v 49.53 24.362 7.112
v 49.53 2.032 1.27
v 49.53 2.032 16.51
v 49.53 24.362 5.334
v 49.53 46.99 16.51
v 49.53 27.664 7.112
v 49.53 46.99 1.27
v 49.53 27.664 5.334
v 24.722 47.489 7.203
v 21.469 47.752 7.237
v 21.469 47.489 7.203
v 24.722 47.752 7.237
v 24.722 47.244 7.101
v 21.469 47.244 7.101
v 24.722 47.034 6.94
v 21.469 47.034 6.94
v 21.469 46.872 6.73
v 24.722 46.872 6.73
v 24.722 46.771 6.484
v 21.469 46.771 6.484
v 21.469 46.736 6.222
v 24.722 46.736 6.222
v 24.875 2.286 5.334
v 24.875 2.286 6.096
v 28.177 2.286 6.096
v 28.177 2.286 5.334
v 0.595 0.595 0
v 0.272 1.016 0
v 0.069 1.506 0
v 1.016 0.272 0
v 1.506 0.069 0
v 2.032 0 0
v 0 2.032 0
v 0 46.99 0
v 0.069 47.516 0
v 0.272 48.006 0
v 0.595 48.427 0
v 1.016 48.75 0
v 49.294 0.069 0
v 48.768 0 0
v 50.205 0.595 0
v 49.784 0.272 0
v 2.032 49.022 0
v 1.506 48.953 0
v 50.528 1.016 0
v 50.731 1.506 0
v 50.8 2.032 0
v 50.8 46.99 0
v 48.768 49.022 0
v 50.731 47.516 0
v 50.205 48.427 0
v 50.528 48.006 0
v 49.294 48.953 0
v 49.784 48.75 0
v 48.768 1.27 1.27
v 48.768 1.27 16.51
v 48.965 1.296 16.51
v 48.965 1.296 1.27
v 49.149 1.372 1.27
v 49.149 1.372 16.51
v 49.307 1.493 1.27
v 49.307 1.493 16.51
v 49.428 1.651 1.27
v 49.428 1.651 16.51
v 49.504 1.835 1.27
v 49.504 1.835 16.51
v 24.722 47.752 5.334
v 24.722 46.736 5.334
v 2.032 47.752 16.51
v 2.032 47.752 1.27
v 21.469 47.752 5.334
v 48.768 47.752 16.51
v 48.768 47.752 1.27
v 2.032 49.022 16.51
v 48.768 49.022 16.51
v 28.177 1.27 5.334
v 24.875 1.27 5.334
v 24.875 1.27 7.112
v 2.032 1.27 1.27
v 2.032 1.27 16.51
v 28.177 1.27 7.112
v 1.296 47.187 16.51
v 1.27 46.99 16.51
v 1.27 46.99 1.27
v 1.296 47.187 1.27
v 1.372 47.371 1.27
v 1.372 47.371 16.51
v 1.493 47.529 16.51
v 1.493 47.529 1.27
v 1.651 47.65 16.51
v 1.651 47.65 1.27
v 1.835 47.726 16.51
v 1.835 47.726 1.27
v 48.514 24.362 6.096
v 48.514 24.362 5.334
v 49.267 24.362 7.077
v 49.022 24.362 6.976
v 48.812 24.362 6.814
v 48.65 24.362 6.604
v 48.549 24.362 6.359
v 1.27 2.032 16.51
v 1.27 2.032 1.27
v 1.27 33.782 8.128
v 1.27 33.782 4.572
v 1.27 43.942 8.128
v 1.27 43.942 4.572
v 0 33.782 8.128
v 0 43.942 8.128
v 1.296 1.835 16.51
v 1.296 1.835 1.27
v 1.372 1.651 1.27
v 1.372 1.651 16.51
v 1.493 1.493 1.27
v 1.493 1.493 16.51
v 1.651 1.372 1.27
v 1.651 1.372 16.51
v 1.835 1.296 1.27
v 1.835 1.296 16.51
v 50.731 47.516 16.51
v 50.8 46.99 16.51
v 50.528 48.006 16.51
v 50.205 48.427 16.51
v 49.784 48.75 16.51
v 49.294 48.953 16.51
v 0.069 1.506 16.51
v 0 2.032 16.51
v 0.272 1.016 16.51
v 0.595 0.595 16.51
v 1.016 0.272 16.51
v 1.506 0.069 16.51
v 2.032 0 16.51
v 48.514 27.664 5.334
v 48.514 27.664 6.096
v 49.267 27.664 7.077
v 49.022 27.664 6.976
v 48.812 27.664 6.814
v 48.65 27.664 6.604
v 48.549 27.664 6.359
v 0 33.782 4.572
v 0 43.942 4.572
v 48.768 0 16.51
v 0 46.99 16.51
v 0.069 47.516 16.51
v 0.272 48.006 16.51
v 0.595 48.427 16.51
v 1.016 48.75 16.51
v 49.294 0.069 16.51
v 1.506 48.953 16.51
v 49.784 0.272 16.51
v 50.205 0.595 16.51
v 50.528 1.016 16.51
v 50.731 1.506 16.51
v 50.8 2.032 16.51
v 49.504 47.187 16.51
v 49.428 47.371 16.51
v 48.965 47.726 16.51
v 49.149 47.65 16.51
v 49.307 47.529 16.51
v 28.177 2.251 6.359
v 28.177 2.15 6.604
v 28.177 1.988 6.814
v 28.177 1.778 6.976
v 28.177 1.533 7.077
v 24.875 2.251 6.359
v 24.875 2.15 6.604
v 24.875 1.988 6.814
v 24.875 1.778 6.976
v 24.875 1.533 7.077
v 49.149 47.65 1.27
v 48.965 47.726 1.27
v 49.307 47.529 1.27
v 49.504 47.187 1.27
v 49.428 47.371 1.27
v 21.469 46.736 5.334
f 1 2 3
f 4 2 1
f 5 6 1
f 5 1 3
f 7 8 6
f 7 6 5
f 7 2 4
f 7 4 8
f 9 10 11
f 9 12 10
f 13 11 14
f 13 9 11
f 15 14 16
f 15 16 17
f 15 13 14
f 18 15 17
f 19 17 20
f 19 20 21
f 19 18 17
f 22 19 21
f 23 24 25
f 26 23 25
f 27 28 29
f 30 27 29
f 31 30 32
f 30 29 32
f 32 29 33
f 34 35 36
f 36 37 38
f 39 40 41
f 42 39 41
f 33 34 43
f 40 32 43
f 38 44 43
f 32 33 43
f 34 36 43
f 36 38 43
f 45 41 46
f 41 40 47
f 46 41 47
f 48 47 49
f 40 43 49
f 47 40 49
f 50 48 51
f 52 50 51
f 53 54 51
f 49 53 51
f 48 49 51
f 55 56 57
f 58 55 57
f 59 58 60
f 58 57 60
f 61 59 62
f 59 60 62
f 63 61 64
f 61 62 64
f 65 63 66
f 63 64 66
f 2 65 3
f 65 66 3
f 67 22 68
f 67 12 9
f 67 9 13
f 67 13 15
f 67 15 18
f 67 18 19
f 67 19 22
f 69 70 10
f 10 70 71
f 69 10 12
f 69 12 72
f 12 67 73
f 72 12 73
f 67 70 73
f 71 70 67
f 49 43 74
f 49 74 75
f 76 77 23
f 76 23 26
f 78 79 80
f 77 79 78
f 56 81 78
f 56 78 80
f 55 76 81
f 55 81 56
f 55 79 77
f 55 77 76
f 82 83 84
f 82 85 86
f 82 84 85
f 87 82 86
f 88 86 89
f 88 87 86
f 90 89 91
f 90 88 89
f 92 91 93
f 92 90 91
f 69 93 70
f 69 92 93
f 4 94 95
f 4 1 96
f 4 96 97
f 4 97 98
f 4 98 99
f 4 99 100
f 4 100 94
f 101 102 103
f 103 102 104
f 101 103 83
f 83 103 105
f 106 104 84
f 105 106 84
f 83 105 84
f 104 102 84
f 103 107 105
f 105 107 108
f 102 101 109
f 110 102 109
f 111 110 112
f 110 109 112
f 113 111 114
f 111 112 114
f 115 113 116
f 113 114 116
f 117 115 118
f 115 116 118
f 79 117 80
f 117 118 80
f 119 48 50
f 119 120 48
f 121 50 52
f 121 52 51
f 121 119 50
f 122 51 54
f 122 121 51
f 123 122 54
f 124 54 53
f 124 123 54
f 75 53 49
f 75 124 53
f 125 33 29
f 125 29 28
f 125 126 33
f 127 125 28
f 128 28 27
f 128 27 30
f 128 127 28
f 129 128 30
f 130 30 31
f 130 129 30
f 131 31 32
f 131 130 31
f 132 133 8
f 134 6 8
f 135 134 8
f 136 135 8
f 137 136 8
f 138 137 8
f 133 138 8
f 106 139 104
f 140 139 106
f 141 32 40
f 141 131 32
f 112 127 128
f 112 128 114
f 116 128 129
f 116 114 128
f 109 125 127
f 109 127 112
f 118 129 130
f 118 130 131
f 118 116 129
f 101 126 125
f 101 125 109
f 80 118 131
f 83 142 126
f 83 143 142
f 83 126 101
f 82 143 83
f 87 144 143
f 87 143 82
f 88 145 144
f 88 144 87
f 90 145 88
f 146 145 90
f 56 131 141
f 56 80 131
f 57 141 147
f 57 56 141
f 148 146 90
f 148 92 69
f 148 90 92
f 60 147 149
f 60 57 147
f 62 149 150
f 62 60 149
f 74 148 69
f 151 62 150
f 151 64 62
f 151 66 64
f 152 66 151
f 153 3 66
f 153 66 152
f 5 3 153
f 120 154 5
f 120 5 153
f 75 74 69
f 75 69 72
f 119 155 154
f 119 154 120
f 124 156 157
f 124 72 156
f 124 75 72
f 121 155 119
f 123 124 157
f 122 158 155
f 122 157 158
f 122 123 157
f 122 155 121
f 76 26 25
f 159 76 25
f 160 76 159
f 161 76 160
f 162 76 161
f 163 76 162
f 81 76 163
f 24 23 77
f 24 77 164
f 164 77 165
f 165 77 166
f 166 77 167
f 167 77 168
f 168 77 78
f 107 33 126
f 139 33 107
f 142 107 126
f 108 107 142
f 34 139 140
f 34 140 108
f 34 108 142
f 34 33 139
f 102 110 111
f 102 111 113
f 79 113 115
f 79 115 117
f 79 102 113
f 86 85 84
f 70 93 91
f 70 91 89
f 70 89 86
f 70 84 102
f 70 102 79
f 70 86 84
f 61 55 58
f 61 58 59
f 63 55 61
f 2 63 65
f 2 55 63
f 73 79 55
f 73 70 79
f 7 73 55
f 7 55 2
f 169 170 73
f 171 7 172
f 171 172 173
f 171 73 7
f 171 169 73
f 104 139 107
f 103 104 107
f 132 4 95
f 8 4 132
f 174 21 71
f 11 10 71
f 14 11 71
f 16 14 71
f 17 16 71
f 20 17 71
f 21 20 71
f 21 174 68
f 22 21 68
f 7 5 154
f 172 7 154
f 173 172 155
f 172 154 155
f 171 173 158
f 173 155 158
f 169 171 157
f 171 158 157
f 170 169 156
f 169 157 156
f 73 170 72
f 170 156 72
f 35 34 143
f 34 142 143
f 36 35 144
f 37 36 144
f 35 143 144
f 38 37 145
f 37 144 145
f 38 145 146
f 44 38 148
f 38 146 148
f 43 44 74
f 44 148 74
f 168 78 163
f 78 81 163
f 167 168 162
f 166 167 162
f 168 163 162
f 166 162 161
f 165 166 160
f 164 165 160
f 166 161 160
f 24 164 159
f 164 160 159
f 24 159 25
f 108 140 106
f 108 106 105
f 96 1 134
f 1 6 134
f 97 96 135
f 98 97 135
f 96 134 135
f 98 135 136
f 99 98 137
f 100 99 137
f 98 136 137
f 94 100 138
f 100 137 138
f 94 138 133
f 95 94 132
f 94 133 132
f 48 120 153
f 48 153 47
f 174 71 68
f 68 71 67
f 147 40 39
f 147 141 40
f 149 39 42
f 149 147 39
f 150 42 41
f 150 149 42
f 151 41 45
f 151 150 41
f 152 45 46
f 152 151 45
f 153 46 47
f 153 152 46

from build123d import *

# Parameters (mm, degrees)
SKETCH1_W           = 50.8
SKETCH1_H           = 49.022
BOSS_EXTRUDE2_DEPTH = 16.51
FILLET1_R           = 2.032
SHELL2_T            = -1.27
SKETCH4_W           = 3.556
SKETCH4_H           = 10.16
CUT_EXTRUDE2_DEPTH  = 1.27
SKETCH7_W           = 3.2520636
SKETCH7_H           = 1.903459875
BOSS_EXTRUDE5_DEPTH = 2.286
FILLET6_R           = 1.016
SKETCH8_W           = 1.778
SKETCH8_H           = 3.302
BOSS_EXTRUDE6_DEPTH = 2.286
FILLET7_R           = 1.016
SKETCH9_W           = 3.302
SKETCH9_H           = 1.778
BOSS_EXTRUDE7_DEPTH = 2.286
FILLET8_R           = 1.016


with BuildPart() as part:
    # Sketch1 → Boss-Extrude2 (new body)
    with BuildSketch(Plane.XY):
        with Locations((25.4, 24.511)):
            Rectangle(SKETCH1_W, SKETCH1_H)
    extrude(amount=BOSS_EXTRUDE2_DEPTH)

    # Fillet1
    fillet1_edges = [part.edges().sort_by_distance(p)[0] for p in [
        (0, 0, 8.255),
        (50.8, 0, 8.255),
        (50.8, 49.022, 8.255),
        (0, 49.022, 8.255),
    ]]
    fillet(fillet1_edges, radius=FILLET1_R)

    # Shell2
    shell2_openings = [part.faces().sort_by_distance(p)[0] for p in [
        (25.4, 24.511, 16.51),
    ]]
    offset(amount=SHELL2_T, openings=shell2_openings, kind=Kind.INTERSECTION)

    # Sketch4 → Cut-Extrude2 (cut)
    with BuildSketch(Plane.ZY):
        with Locations((6.35, 38.862)):
            Rectangle(SKETCH4_W, SKETCH4_H)
    extrude(amount=-CUT_EXTRUDE2_DEPTH, mode=Mode.SUBTRACT)

    # Sketch7 → Boss-Extrude5 (add)
    with BuildSketch(Plane(origin=(0, 49.022, 0), x_dir=(1, 0, 0), z_dir=(0, 1, 0))):
        with Locations((23.095521807, -6.285729938)):
            Rectangle(SKETCH7_W, SKETCH7_H)
    extrude(amount=-BOSS_EXTRUDE5_DEPTH)

    # Fillet6
    fillet6_edges = [part.edges().sort_by_distance(p)[0] for p in [
        (23.095521807, 46.736, 7.237459875),
    ]]
    fillet(fillet6_edges, radius=FILLET6_R - 0.0001)  # a hair under: the kernel refuses the full size

    # Sketch8 → Boss-Extrude6 (add)
    with BuildSketch(Plane(origin=(50.8, 0, 0), x_dir=(0, 0, -1), z_dir=(1, 0, 0))):
        with Locations((-6.223, 26.013260114)):
            Rectangle(SKETCH8_W, SKETCH8_H)
    extrude(amount=-BOSS_EXTRUDE6_DEPTH)

    # Fillet7
    fillet7_edges = [part.edges().sort_by_distance(p)[0] for p in [
        (48.514, 26.013260114, 7.112),
    ]]
    fillet(fillet7_edges, radius=FILLET7_R - 0.0001)  # a hair under: the kernel refuses the full size

    # Sketch9 → Boss-Extrude7 (add)
    with BuildSketch(Plane.XZ):
        with Locations((26.526394694, 6.223)):
            Rectangle(SKETCH9_W, SKETCH9_H)
    extrude(amount=-BOSS_EXTRUDE7_DEPTH)

    # Fillet8
    fillet8_edges = [part.edges().sort_by_distance(p)[0] for p in [
        (26.526394694, 2.286, 7.112),
    ]]
    fillet(fillet8_edges, radius=FILLET8_R - 0.0001)  # a hair under: the kernel refuses the full size


solid = part.part
